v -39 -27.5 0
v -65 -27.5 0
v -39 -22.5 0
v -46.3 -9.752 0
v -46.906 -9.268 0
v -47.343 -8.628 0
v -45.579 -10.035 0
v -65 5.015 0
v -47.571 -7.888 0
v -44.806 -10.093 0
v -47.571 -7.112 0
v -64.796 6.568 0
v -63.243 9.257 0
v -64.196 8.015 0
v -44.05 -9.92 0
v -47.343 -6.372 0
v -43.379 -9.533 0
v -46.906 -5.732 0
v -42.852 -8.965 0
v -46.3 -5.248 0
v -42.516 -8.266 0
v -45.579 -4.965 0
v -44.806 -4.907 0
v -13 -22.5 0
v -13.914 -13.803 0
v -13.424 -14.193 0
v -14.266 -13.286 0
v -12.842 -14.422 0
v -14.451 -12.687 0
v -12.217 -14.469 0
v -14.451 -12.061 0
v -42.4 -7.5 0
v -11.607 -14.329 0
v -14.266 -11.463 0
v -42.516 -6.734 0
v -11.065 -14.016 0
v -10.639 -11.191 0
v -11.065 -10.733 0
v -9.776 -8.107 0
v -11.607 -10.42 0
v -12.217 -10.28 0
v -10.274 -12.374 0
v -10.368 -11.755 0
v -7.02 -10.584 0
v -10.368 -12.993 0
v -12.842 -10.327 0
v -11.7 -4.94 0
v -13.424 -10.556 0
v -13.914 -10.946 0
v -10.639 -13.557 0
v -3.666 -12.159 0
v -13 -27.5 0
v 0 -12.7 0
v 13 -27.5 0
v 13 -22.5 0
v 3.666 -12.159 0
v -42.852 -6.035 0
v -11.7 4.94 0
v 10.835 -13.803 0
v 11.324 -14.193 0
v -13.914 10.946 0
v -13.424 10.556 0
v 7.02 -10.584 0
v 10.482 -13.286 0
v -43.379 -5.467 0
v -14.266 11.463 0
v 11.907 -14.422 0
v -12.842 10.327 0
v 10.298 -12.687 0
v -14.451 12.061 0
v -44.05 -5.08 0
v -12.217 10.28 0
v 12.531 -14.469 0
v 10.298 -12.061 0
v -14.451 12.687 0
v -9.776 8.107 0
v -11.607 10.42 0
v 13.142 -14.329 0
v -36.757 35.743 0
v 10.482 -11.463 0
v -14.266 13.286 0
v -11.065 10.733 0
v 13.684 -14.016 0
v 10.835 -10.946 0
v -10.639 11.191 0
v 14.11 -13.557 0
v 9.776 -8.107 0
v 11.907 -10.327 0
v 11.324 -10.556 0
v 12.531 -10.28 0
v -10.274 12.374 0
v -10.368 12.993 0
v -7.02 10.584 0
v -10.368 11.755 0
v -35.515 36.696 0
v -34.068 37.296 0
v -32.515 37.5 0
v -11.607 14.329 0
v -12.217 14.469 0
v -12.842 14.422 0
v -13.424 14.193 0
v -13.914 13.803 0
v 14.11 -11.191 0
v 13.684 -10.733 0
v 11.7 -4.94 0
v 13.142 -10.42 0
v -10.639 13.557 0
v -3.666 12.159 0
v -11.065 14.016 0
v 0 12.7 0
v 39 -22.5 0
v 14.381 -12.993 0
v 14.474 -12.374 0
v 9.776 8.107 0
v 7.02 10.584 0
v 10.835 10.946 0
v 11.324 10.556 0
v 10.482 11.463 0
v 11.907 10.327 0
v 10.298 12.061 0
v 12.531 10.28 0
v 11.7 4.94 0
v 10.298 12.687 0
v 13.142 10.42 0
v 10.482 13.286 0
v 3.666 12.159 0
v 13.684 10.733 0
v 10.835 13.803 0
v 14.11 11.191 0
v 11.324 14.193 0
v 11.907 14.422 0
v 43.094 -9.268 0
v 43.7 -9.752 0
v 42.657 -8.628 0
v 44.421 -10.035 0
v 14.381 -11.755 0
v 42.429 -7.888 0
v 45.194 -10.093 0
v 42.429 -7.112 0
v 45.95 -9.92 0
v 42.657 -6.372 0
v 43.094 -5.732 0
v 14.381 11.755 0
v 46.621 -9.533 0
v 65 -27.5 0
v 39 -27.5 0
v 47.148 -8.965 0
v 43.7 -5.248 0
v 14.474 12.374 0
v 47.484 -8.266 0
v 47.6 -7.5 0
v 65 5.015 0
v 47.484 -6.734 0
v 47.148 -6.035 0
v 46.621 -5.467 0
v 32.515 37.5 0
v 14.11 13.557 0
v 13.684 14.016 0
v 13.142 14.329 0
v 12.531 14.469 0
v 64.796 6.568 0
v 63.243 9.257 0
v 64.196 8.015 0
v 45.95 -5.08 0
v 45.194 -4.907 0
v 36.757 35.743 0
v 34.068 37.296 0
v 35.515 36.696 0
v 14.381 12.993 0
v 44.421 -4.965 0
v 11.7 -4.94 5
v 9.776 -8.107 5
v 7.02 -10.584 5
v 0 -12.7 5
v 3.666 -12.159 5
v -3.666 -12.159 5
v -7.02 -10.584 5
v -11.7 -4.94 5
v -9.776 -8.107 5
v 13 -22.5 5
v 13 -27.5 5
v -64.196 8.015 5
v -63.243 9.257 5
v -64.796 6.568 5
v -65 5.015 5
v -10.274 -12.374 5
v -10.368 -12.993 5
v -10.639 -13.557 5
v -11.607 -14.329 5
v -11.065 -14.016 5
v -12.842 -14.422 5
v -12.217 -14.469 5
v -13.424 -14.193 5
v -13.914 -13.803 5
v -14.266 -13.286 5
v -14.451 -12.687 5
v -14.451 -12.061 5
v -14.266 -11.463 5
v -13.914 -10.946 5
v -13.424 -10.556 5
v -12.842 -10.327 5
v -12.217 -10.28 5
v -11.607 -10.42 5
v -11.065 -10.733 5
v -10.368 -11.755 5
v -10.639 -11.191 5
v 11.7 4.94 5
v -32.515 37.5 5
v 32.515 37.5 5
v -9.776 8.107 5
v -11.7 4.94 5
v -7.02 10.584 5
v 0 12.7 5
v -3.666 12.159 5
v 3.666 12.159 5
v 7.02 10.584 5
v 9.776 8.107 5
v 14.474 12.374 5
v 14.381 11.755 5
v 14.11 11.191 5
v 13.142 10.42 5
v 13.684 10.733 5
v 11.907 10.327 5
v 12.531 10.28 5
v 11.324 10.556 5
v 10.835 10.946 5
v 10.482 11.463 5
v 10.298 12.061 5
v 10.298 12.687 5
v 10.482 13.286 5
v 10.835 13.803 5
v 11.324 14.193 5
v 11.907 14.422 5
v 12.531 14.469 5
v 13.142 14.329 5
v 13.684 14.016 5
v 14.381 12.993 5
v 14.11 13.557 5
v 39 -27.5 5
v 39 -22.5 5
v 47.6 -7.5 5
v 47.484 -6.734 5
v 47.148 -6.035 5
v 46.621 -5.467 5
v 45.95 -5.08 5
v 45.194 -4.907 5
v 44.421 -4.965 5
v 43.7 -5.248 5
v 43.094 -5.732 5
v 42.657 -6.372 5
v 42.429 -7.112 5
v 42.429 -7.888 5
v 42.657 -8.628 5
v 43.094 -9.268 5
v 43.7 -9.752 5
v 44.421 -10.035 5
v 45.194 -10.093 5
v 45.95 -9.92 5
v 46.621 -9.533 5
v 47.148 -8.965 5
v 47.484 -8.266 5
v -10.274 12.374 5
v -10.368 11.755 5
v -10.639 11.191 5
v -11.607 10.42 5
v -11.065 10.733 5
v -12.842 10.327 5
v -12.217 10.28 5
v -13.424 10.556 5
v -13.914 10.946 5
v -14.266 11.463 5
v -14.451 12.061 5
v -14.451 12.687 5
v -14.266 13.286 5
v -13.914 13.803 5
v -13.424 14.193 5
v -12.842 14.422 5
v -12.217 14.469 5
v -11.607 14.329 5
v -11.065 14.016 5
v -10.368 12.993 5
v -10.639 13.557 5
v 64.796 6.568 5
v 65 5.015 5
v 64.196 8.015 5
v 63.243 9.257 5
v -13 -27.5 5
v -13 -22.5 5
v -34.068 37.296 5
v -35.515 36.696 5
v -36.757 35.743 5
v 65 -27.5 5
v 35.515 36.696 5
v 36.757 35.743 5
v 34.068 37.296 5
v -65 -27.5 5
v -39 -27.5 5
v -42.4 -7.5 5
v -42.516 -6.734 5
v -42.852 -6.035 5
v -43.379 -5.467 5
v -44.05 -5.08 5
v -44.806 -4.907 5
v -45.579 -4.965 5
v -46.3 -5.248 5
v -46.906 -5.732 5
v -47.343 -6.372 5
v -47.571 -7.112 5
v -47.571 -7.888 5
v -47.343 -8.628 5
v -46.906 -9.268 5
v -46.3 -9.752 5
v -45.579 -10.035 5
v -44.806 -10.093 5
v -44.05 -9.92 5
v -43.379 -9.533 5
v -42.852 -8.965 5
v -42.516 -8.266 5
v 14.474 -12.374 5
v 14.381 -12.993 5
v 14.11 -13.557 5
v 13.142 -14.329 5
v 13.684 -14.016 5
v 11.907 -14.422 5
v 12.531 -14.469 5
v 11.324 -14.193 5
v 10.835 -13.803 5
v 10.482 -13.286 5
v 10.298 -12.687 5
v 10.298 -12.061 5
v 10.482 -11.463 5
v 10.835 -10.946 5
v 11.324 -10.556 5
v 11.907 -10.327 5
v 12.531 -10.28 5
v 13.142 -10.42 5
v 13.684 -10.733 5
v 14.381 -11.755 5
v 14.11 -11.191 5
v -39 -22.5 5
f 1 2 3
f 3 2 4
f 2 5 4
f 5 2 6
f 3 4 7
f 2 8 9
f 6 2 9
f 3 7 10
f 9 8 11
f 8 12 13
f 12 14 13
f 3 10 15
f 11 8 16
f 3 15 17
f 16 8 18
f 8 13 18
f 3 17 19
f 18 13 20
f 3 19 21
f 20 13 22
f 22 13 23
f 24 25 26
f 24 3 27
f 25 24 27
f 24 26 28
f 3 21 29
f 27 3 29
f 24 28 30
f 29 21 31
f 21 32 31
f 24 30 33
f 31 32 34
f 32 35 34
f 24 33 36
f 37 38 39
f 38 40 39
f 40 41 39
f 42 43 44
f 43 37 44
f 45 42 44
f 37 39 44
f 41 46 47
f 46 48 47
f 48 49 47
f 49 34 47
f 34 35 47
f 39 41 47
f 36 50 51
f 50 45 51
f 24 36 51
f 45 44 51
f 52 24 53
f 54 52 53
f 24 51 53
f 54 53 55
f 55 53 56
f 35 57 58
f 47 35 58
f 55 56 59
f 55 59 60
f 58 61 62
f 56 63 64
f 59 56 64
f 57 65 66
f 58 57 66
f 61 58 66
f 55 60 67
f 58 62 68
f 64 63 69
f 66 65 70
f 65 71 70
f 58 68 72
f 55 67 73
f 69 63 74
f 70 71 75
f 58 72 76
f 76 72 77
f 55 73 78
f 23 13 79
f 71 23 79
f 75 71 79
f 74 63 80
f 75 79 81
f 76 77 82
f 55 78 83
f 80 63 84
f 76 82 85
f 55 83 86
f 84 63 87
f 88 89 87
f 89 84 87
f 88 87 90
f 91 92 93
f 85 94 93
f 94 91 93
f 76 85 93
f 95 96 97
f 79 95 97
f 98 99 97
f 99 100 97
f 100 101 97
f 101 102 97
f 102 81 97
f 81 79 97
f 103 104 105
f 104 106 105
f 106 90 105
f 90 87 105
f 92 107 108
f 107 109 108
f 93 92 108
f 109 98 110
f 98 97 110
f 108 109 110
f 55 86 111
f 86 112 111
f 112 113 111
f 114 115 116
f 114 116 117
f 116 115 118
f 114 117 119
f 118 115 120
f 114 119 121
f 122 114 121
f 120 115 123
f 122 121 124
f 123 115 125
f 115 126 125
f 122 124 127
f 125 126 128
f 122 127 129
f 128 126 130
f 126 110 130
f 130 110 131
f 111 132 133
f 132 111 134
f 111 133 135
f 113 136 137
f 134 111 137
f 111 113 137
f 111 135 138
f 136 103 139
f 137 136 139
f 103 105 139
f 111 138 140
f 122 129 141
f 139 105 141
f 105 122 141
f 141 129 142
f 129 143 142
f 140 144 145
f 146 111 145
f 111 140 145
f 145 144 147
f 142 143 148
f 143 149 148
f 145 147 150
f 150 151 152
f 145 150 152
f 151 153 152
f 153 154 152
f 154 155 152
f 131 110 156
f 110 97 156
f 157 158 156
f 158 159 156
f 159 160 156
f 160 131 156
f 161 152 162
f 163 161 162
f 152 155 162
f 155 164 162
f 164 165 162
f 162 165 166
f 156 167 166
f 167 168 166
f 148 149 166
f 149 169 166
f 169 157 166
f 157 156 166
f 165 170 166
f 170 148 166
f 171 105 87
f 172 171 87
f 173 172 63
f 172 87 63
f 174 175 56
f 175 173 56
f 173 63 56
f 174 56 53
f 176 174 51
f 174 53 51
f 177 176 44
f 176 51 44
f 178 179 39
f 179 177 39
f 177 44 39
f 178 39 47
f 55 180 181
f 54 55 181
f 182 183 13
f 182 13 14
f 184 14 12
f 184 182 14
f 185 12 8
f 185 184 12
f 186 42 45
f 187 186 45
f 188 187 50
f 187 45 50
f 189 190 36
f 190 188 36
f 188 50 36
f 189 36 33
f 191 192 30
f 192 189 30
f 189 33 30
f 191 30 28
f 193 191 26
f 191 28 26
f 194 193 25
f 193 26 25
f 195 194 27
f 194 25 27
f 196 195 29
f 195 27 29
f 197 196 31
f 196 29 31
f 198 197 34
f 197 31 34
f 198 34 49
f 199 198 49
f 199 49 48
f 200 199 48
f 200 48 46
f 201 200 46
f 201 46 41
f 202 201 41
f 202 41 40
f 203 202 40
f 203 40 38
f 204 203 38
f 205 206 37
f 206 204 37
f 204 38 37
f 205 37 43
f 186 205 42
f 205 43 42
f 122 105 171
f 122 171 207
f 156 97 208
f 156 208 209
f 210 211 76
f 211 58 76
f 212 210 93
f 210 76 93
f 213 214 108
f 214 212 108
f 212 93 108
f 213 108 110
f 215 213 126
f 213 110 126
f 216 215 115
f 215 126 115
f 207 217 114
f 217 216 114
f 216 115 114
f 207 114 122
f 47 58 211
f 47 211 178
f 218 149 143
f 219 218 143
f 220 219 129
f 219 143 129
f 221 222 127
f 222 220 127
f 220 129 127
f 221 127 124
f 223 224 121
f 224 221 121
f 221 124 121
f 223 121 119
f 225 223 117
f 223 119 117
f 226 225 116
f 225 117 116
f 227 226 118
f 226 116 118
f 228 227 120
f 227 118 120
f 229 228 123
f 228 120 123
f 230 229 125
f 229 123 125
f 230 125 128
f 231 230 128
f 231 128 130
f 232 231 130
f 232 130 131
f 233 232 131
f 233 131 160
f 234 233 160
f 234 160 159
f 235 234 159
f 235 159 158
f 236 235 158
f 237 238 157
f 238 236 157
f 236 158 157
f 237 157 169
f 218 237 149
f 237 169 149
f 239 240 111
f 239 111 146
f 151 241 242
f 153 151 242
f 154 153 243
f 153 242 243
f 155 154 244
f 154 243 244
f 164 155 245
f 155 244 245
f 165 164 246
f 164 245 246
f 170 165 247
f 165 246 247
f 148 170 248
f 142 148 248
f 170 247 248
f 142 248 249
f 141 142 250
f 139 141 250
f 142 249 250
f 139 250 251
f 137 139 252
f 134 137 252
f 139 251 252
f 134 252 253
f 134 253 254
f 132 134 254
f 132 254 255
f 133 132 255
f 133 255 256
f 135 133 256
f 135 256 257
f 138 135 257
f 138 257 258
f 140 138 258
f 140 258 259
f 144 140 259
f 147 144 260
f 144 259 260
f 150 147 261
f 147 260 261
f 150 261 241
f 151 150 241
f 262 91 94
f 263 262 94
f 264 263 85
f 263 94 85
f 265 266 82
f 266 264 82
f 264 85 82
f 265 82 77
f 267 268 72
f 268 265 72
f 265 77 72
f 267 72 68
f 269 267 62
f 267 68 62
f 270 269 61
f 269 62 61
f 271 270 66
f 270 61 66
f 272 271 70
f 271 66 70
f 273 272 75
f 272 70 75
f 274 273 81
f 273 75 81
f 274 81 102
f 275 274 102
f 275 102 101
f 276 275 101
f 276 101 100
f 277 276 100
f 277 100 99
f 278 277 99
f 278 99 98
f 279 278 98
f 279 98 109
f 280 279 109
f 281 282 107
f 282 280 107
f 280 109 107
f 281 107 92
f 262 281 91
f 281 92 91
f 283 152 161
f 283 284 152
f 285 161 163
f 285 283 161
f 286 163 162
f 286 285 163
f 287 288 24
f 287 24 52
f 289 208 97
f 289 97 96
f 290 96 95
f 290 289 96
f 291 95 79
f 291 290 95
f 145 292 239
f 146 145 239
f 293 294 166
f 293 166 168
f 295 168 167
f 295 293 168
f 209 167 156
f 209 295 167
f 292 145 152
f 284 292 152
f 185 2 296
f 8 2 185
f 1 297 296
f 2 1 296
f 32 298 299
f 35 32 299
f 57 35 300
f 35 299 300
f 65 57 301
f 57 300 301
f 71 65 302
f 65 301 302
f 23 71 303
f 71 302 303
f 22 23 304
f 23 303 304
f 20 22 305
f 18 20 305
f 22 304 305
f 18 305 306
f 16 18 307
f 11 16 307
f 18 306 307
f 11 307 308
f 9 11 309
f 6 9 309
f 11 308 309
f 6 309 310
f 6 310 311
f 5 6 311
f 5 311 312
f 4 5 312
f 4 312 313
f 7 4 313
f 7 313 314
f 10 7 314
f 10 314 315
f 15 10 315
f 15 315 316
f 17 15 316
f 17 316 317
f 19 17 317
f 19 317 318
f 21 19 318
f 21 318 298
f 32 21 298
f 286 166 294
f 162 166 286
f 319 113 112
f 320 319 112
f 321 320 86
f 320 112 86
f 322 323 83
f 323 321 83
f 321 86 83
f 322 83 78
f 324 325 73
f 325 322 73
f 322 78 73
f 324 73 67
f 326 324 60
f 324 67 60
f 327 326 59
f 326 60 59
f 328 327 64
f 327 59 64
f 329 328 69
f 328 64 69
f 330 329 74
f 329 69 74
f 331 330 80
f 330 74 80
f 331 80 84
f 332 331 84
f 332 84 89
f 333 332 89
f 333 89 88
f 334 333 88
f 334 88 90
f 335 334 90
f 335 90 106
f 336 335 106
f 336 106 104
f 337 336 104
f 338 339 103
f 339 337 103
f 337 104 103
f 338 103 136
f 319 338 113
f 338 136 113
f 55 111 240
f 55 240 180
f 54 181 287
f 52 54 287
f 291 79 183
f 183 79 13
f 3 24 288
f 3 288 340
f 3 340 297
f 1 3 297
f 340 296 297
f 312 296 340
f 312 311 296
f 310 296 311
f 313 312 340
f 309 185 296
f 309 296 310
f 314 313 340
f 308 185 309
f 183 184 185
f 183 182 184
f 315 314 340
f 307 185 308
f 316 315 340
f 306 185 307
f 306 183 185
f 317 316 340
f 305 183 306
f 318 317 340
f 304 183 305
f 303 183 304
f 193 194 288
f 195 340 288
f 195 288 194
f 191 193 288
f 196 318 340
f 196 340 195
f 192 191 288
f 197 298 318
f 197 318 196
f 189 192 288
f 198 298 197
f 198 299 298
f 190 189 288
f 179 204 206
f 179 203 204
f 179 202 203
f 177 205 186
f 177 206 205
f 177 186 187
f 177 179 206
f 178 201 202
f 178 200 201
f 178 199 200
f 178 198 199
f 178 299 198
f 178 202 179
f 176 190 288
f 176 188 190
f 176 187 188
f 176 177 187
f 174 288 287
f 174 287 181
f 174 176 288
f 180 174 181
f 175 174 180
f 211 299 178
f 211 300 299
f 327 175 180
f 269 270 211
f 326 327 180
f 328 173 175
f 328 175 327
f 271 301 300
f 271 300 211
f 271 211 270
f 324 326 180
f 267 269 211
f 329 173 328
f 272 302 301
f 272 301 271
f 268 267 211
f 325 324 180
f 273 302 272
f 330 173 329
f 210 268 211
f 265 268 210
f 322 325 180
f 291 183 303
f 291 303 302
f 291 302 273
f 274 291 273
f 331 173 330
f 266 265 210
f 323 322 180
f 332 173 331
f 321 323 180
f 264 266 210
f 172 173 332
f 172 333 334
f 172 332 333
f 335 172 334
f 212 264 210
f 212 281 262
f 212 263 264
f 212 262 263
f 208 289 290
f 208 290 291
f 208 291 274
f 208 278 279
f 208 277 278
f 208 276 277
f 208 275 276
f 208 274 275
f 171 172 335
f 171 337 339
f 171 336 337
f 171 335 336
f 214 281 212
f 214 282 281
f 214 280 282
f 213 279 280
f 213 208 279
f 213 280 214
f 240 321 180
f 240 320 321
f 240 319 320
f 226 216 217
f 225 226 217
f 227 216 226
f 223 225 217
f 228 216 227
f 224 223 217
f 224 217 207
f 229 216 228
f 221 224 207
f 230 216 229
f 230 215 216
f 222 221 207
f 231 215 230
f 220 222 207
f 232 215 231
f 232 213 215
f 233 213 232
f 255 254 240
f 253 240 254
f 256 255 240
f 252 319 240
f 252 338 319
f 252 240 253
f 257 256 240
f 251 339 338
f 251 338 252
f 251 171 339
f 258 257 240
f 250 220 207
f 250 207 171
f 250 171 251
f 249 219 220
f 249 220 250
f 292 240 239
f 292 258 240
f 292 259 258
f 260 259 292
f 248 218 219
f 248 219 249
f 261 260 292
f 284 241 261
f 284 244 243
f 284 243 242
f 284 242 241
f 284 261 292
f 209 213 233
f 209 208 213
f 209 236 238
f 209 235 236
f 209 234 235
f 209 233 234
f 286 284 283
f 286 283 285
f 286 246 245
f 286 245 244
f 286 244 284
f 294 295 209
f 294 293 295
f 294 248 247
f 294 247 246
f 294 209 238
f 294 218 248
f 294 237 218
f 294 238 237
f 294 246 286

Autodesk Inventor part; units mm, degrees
ref_plane "YZ Plane" through (0, 0, 0) normal (1, 0, 0) x (0, 1, 0)
ref_plane "XZ Plane" through (0, 0, 0) normal (0, 1, 0) x (-1, 0, 0)
ref_plane "XY Plane" through (0, 0, 0) normal (0, 0, 1) x (1, 0, 0)
sketch "스케치1" plane through (0, 0, 0) normal (0, 0, 1) x (1, 0, 0)
  circle A0 centre (0, 0) radius 21.2
  line L0 (25, -22.5) -> (25, 27.5)
  line L1 (-25, 27.5) -> (-25, -22.5)
  circle A1 centre (0, 0) radius 22.3
  line L2 (25, 27.5) -> (-25, 27.5)
  line L3 (-11.7, 4.9396) -> (-11.7, -4.9396)
  arc A2 (-11.7, -4.9396) -> (11.7, -4.9396) centre (0, 0) ccw
  line L4 (11.7, -4.9396) -> (11.7, 4.9396)
  arc A3 (11.7, 4.9396) -> (-11.7, 4.9396) centre (0, 0) ccw
  circle A4 centre (12.3744, -12.3744) radius 2.1
  circle A5 centre (12.3744, 12.3744) radius 2.1
  circle A6 centre (-12.3744, 12.3744) radius 2.1
  circle A7 centre (-12.3744, -12.3744) radius 2.1
  line L5 (50, -22.5) -> (-50, -22.5)
  line L6 (50, -22.5) -> (50, -2.5)
  line L7 (50, -2.5) -> (25, 27.5)
  line L8 (-50, -22.5) -> (-50, -2.5)
  line L9 (-50, -2.5) -> (-25, 27.5)
  line L10 (-50, -22.5) -> (-65, -22.5)
  line L11 (50, -22.5) -> (65, -22.5)
  line L12 (65, -22.5) -> (65, -2.5)
  line L13 (-65, -22.5) -> (-65, -2.5)
  line L14 (-65, -2.5) -> (-25, 27.5)
  line L15 (25, 27.5) -> (65, -2.5)
  line L16 (-65, -22.5) -> (-65, 7.5)
  line L17 (65, -22.5) -> (65, 7.5)
  line L18 (25, -22.5) -> (25, 37.5)
  line L19 (-25, -22.5) -> (-25, 37.5)
  line L20 (-25, 37.5) -> (-65, 7.5)
  line L21 (-25, 37.5) -> (25, 37.5)
  line L22 (25, 37.5) -> (65, 7.5)
  line L23 (-25, 37.5) -> (-35, 37.5)
  line L24 (-35, 37.5) -> (-65, 7.5)
  line L25 (25, 37.5) -> (35, 37.5)
  line L26 (35, 37.5) -> (65, 7.5)
  dimension "d17" = 360
  dimension "d29" = 20
  dimension "d30" = 20
  dimension "d33" = 15
  dimension "d34" = 15
  dimension "d35" = 30
  dimension "d36" = 30
  dimension "d37" = 60
  dimension "d38" = 60
  dimension "d39" = 10
  dimension "d40" = 10
extrude "판1" add sketch "스케치1" along normal blind 5 contours A0 | L5 L1 L2 L0 | L0 L7 L6 L5 | L15 L12 L11 L6 L7 | L18 L22 L17 L15 | L2 L19 L21 L18 | L5 L8 L9 L1 | L9 L8 L10 L13 L14 | L14 L16 L20 L19 | L25 L26 L22 | L20 L24 L23 | A1
fillet "모서리 라운드2" radius 6 4 edges at (-35, 37.5, 2.5) (-65, 7.5, 2.5) (35, 37.5, 2.5) (65, 7.5, 2.5)
sketch "스케치2" plane through (0, 0, 5) normal (0, 0, 1) x (1, 0, 0)
  line L0 (-65, -22.5) -> (-65, 5.0147) projected
  line L1 (-65, -22.5) -> (-60, -22.5)
  line L2 (65, -22.5) -> (-65, -22.5) projected
  line L3 (65, -22.5) -> (60, -22.5)
  line L4 (60, -22.5) -> (30, -22.5)
  line L5 (30, -22.5) -> (30, 7.5)
  line L6 (30, 7.5) -> (60, 7.5)
  line L7 (60, 7.5) -> (60, -22.5)
  line L8 (-60, -22.5) -> (-30, -22.5)
  line L9 (-30, -22.5) -> (-30, 7.5)
  line L10 (-30, 7.5) -> (-60, 7.5)
  line L11 (-60, 7.5) -> (-60, -22.5)
  line L12 (-60, -22.5) -> (-45, -22.5)
  line L13 (-45, -22.5) -> (-45, -7.5)
  line L14 (60, -22.5) -> (45, -22.5)
  line L15 (45, -22.5) -> (45, -7.5)
  circle A0 centre (45, -7.5) radius 2.6
  circle A1 centre (-45, -7.5) radius 2.6
  point P0 (0, 0)
  dimension "d42" = 5
  dimension "d43" = 5
  dimension "d44" = 30
  dimension "d45" = 30
  dimension "d46" = 30
  dimension "d47" = 30
  dimension "d48" = 15
  dimension "d49" = 5.2
  dimension "d50" = 5.2
extrude "돌출1" cut sketch "스케치2" against normal through all contours A0 | A1
sketch "스케치3" plane through (0, 0, 5) normal (0, 0, 1) x (1, 0, 0)
  line L0 (65, -22.5) -> (-65, -22.5) projected
  line L1 (-65, -22.5) -> (65, -22.5)
  line L2 (65, -22.5) -> (65, -27.5)
  line L3 (65, -27.5) -> (-65, -27.5)
  line L4 (-65, -27.5) -> (-65, -22.5)
  line L5 (-65, -22.5) -> (-39, -22.5)
  line L6 (-39, -22.5) -> (-13, -22.5)
  line L7 (-13, -22.5) -> (13, -22.5)
  line L8 (13, -22.5) -> (39, -22.5)
  line L9 (39, -22.5) -> (65, -22.5)
  line L10 (-39, -22.5) -> (-39, -27.5)
  line L11 (-13, -22.5) -> (-13, -27.5)
  line L12 (13, -22.5) -> (13, -27.5)
  line L13 (39, -22.5) -> (39, -27.5)
  point P0 (0, 0)
  dimension "d53" = 130
  dimension "d54" = 5
  dimension "d55" = 26
  dimension "d56" = 26
  dimension "d57" = 26
  dimension "d58" = 26
  dimension "d59" = 26
extrude "돌출2" add sketch "스케치3" against normal blind 5 contours L2 L3 L13 L0 | L12 L3 L11 L0 | L10 L3 L4 L0
equation "\"TransitionRadius\" = BendRadius"
equation "\"BendRadius\" = 5"
properties part number "motor_wall" material "알루미늄 6061"
